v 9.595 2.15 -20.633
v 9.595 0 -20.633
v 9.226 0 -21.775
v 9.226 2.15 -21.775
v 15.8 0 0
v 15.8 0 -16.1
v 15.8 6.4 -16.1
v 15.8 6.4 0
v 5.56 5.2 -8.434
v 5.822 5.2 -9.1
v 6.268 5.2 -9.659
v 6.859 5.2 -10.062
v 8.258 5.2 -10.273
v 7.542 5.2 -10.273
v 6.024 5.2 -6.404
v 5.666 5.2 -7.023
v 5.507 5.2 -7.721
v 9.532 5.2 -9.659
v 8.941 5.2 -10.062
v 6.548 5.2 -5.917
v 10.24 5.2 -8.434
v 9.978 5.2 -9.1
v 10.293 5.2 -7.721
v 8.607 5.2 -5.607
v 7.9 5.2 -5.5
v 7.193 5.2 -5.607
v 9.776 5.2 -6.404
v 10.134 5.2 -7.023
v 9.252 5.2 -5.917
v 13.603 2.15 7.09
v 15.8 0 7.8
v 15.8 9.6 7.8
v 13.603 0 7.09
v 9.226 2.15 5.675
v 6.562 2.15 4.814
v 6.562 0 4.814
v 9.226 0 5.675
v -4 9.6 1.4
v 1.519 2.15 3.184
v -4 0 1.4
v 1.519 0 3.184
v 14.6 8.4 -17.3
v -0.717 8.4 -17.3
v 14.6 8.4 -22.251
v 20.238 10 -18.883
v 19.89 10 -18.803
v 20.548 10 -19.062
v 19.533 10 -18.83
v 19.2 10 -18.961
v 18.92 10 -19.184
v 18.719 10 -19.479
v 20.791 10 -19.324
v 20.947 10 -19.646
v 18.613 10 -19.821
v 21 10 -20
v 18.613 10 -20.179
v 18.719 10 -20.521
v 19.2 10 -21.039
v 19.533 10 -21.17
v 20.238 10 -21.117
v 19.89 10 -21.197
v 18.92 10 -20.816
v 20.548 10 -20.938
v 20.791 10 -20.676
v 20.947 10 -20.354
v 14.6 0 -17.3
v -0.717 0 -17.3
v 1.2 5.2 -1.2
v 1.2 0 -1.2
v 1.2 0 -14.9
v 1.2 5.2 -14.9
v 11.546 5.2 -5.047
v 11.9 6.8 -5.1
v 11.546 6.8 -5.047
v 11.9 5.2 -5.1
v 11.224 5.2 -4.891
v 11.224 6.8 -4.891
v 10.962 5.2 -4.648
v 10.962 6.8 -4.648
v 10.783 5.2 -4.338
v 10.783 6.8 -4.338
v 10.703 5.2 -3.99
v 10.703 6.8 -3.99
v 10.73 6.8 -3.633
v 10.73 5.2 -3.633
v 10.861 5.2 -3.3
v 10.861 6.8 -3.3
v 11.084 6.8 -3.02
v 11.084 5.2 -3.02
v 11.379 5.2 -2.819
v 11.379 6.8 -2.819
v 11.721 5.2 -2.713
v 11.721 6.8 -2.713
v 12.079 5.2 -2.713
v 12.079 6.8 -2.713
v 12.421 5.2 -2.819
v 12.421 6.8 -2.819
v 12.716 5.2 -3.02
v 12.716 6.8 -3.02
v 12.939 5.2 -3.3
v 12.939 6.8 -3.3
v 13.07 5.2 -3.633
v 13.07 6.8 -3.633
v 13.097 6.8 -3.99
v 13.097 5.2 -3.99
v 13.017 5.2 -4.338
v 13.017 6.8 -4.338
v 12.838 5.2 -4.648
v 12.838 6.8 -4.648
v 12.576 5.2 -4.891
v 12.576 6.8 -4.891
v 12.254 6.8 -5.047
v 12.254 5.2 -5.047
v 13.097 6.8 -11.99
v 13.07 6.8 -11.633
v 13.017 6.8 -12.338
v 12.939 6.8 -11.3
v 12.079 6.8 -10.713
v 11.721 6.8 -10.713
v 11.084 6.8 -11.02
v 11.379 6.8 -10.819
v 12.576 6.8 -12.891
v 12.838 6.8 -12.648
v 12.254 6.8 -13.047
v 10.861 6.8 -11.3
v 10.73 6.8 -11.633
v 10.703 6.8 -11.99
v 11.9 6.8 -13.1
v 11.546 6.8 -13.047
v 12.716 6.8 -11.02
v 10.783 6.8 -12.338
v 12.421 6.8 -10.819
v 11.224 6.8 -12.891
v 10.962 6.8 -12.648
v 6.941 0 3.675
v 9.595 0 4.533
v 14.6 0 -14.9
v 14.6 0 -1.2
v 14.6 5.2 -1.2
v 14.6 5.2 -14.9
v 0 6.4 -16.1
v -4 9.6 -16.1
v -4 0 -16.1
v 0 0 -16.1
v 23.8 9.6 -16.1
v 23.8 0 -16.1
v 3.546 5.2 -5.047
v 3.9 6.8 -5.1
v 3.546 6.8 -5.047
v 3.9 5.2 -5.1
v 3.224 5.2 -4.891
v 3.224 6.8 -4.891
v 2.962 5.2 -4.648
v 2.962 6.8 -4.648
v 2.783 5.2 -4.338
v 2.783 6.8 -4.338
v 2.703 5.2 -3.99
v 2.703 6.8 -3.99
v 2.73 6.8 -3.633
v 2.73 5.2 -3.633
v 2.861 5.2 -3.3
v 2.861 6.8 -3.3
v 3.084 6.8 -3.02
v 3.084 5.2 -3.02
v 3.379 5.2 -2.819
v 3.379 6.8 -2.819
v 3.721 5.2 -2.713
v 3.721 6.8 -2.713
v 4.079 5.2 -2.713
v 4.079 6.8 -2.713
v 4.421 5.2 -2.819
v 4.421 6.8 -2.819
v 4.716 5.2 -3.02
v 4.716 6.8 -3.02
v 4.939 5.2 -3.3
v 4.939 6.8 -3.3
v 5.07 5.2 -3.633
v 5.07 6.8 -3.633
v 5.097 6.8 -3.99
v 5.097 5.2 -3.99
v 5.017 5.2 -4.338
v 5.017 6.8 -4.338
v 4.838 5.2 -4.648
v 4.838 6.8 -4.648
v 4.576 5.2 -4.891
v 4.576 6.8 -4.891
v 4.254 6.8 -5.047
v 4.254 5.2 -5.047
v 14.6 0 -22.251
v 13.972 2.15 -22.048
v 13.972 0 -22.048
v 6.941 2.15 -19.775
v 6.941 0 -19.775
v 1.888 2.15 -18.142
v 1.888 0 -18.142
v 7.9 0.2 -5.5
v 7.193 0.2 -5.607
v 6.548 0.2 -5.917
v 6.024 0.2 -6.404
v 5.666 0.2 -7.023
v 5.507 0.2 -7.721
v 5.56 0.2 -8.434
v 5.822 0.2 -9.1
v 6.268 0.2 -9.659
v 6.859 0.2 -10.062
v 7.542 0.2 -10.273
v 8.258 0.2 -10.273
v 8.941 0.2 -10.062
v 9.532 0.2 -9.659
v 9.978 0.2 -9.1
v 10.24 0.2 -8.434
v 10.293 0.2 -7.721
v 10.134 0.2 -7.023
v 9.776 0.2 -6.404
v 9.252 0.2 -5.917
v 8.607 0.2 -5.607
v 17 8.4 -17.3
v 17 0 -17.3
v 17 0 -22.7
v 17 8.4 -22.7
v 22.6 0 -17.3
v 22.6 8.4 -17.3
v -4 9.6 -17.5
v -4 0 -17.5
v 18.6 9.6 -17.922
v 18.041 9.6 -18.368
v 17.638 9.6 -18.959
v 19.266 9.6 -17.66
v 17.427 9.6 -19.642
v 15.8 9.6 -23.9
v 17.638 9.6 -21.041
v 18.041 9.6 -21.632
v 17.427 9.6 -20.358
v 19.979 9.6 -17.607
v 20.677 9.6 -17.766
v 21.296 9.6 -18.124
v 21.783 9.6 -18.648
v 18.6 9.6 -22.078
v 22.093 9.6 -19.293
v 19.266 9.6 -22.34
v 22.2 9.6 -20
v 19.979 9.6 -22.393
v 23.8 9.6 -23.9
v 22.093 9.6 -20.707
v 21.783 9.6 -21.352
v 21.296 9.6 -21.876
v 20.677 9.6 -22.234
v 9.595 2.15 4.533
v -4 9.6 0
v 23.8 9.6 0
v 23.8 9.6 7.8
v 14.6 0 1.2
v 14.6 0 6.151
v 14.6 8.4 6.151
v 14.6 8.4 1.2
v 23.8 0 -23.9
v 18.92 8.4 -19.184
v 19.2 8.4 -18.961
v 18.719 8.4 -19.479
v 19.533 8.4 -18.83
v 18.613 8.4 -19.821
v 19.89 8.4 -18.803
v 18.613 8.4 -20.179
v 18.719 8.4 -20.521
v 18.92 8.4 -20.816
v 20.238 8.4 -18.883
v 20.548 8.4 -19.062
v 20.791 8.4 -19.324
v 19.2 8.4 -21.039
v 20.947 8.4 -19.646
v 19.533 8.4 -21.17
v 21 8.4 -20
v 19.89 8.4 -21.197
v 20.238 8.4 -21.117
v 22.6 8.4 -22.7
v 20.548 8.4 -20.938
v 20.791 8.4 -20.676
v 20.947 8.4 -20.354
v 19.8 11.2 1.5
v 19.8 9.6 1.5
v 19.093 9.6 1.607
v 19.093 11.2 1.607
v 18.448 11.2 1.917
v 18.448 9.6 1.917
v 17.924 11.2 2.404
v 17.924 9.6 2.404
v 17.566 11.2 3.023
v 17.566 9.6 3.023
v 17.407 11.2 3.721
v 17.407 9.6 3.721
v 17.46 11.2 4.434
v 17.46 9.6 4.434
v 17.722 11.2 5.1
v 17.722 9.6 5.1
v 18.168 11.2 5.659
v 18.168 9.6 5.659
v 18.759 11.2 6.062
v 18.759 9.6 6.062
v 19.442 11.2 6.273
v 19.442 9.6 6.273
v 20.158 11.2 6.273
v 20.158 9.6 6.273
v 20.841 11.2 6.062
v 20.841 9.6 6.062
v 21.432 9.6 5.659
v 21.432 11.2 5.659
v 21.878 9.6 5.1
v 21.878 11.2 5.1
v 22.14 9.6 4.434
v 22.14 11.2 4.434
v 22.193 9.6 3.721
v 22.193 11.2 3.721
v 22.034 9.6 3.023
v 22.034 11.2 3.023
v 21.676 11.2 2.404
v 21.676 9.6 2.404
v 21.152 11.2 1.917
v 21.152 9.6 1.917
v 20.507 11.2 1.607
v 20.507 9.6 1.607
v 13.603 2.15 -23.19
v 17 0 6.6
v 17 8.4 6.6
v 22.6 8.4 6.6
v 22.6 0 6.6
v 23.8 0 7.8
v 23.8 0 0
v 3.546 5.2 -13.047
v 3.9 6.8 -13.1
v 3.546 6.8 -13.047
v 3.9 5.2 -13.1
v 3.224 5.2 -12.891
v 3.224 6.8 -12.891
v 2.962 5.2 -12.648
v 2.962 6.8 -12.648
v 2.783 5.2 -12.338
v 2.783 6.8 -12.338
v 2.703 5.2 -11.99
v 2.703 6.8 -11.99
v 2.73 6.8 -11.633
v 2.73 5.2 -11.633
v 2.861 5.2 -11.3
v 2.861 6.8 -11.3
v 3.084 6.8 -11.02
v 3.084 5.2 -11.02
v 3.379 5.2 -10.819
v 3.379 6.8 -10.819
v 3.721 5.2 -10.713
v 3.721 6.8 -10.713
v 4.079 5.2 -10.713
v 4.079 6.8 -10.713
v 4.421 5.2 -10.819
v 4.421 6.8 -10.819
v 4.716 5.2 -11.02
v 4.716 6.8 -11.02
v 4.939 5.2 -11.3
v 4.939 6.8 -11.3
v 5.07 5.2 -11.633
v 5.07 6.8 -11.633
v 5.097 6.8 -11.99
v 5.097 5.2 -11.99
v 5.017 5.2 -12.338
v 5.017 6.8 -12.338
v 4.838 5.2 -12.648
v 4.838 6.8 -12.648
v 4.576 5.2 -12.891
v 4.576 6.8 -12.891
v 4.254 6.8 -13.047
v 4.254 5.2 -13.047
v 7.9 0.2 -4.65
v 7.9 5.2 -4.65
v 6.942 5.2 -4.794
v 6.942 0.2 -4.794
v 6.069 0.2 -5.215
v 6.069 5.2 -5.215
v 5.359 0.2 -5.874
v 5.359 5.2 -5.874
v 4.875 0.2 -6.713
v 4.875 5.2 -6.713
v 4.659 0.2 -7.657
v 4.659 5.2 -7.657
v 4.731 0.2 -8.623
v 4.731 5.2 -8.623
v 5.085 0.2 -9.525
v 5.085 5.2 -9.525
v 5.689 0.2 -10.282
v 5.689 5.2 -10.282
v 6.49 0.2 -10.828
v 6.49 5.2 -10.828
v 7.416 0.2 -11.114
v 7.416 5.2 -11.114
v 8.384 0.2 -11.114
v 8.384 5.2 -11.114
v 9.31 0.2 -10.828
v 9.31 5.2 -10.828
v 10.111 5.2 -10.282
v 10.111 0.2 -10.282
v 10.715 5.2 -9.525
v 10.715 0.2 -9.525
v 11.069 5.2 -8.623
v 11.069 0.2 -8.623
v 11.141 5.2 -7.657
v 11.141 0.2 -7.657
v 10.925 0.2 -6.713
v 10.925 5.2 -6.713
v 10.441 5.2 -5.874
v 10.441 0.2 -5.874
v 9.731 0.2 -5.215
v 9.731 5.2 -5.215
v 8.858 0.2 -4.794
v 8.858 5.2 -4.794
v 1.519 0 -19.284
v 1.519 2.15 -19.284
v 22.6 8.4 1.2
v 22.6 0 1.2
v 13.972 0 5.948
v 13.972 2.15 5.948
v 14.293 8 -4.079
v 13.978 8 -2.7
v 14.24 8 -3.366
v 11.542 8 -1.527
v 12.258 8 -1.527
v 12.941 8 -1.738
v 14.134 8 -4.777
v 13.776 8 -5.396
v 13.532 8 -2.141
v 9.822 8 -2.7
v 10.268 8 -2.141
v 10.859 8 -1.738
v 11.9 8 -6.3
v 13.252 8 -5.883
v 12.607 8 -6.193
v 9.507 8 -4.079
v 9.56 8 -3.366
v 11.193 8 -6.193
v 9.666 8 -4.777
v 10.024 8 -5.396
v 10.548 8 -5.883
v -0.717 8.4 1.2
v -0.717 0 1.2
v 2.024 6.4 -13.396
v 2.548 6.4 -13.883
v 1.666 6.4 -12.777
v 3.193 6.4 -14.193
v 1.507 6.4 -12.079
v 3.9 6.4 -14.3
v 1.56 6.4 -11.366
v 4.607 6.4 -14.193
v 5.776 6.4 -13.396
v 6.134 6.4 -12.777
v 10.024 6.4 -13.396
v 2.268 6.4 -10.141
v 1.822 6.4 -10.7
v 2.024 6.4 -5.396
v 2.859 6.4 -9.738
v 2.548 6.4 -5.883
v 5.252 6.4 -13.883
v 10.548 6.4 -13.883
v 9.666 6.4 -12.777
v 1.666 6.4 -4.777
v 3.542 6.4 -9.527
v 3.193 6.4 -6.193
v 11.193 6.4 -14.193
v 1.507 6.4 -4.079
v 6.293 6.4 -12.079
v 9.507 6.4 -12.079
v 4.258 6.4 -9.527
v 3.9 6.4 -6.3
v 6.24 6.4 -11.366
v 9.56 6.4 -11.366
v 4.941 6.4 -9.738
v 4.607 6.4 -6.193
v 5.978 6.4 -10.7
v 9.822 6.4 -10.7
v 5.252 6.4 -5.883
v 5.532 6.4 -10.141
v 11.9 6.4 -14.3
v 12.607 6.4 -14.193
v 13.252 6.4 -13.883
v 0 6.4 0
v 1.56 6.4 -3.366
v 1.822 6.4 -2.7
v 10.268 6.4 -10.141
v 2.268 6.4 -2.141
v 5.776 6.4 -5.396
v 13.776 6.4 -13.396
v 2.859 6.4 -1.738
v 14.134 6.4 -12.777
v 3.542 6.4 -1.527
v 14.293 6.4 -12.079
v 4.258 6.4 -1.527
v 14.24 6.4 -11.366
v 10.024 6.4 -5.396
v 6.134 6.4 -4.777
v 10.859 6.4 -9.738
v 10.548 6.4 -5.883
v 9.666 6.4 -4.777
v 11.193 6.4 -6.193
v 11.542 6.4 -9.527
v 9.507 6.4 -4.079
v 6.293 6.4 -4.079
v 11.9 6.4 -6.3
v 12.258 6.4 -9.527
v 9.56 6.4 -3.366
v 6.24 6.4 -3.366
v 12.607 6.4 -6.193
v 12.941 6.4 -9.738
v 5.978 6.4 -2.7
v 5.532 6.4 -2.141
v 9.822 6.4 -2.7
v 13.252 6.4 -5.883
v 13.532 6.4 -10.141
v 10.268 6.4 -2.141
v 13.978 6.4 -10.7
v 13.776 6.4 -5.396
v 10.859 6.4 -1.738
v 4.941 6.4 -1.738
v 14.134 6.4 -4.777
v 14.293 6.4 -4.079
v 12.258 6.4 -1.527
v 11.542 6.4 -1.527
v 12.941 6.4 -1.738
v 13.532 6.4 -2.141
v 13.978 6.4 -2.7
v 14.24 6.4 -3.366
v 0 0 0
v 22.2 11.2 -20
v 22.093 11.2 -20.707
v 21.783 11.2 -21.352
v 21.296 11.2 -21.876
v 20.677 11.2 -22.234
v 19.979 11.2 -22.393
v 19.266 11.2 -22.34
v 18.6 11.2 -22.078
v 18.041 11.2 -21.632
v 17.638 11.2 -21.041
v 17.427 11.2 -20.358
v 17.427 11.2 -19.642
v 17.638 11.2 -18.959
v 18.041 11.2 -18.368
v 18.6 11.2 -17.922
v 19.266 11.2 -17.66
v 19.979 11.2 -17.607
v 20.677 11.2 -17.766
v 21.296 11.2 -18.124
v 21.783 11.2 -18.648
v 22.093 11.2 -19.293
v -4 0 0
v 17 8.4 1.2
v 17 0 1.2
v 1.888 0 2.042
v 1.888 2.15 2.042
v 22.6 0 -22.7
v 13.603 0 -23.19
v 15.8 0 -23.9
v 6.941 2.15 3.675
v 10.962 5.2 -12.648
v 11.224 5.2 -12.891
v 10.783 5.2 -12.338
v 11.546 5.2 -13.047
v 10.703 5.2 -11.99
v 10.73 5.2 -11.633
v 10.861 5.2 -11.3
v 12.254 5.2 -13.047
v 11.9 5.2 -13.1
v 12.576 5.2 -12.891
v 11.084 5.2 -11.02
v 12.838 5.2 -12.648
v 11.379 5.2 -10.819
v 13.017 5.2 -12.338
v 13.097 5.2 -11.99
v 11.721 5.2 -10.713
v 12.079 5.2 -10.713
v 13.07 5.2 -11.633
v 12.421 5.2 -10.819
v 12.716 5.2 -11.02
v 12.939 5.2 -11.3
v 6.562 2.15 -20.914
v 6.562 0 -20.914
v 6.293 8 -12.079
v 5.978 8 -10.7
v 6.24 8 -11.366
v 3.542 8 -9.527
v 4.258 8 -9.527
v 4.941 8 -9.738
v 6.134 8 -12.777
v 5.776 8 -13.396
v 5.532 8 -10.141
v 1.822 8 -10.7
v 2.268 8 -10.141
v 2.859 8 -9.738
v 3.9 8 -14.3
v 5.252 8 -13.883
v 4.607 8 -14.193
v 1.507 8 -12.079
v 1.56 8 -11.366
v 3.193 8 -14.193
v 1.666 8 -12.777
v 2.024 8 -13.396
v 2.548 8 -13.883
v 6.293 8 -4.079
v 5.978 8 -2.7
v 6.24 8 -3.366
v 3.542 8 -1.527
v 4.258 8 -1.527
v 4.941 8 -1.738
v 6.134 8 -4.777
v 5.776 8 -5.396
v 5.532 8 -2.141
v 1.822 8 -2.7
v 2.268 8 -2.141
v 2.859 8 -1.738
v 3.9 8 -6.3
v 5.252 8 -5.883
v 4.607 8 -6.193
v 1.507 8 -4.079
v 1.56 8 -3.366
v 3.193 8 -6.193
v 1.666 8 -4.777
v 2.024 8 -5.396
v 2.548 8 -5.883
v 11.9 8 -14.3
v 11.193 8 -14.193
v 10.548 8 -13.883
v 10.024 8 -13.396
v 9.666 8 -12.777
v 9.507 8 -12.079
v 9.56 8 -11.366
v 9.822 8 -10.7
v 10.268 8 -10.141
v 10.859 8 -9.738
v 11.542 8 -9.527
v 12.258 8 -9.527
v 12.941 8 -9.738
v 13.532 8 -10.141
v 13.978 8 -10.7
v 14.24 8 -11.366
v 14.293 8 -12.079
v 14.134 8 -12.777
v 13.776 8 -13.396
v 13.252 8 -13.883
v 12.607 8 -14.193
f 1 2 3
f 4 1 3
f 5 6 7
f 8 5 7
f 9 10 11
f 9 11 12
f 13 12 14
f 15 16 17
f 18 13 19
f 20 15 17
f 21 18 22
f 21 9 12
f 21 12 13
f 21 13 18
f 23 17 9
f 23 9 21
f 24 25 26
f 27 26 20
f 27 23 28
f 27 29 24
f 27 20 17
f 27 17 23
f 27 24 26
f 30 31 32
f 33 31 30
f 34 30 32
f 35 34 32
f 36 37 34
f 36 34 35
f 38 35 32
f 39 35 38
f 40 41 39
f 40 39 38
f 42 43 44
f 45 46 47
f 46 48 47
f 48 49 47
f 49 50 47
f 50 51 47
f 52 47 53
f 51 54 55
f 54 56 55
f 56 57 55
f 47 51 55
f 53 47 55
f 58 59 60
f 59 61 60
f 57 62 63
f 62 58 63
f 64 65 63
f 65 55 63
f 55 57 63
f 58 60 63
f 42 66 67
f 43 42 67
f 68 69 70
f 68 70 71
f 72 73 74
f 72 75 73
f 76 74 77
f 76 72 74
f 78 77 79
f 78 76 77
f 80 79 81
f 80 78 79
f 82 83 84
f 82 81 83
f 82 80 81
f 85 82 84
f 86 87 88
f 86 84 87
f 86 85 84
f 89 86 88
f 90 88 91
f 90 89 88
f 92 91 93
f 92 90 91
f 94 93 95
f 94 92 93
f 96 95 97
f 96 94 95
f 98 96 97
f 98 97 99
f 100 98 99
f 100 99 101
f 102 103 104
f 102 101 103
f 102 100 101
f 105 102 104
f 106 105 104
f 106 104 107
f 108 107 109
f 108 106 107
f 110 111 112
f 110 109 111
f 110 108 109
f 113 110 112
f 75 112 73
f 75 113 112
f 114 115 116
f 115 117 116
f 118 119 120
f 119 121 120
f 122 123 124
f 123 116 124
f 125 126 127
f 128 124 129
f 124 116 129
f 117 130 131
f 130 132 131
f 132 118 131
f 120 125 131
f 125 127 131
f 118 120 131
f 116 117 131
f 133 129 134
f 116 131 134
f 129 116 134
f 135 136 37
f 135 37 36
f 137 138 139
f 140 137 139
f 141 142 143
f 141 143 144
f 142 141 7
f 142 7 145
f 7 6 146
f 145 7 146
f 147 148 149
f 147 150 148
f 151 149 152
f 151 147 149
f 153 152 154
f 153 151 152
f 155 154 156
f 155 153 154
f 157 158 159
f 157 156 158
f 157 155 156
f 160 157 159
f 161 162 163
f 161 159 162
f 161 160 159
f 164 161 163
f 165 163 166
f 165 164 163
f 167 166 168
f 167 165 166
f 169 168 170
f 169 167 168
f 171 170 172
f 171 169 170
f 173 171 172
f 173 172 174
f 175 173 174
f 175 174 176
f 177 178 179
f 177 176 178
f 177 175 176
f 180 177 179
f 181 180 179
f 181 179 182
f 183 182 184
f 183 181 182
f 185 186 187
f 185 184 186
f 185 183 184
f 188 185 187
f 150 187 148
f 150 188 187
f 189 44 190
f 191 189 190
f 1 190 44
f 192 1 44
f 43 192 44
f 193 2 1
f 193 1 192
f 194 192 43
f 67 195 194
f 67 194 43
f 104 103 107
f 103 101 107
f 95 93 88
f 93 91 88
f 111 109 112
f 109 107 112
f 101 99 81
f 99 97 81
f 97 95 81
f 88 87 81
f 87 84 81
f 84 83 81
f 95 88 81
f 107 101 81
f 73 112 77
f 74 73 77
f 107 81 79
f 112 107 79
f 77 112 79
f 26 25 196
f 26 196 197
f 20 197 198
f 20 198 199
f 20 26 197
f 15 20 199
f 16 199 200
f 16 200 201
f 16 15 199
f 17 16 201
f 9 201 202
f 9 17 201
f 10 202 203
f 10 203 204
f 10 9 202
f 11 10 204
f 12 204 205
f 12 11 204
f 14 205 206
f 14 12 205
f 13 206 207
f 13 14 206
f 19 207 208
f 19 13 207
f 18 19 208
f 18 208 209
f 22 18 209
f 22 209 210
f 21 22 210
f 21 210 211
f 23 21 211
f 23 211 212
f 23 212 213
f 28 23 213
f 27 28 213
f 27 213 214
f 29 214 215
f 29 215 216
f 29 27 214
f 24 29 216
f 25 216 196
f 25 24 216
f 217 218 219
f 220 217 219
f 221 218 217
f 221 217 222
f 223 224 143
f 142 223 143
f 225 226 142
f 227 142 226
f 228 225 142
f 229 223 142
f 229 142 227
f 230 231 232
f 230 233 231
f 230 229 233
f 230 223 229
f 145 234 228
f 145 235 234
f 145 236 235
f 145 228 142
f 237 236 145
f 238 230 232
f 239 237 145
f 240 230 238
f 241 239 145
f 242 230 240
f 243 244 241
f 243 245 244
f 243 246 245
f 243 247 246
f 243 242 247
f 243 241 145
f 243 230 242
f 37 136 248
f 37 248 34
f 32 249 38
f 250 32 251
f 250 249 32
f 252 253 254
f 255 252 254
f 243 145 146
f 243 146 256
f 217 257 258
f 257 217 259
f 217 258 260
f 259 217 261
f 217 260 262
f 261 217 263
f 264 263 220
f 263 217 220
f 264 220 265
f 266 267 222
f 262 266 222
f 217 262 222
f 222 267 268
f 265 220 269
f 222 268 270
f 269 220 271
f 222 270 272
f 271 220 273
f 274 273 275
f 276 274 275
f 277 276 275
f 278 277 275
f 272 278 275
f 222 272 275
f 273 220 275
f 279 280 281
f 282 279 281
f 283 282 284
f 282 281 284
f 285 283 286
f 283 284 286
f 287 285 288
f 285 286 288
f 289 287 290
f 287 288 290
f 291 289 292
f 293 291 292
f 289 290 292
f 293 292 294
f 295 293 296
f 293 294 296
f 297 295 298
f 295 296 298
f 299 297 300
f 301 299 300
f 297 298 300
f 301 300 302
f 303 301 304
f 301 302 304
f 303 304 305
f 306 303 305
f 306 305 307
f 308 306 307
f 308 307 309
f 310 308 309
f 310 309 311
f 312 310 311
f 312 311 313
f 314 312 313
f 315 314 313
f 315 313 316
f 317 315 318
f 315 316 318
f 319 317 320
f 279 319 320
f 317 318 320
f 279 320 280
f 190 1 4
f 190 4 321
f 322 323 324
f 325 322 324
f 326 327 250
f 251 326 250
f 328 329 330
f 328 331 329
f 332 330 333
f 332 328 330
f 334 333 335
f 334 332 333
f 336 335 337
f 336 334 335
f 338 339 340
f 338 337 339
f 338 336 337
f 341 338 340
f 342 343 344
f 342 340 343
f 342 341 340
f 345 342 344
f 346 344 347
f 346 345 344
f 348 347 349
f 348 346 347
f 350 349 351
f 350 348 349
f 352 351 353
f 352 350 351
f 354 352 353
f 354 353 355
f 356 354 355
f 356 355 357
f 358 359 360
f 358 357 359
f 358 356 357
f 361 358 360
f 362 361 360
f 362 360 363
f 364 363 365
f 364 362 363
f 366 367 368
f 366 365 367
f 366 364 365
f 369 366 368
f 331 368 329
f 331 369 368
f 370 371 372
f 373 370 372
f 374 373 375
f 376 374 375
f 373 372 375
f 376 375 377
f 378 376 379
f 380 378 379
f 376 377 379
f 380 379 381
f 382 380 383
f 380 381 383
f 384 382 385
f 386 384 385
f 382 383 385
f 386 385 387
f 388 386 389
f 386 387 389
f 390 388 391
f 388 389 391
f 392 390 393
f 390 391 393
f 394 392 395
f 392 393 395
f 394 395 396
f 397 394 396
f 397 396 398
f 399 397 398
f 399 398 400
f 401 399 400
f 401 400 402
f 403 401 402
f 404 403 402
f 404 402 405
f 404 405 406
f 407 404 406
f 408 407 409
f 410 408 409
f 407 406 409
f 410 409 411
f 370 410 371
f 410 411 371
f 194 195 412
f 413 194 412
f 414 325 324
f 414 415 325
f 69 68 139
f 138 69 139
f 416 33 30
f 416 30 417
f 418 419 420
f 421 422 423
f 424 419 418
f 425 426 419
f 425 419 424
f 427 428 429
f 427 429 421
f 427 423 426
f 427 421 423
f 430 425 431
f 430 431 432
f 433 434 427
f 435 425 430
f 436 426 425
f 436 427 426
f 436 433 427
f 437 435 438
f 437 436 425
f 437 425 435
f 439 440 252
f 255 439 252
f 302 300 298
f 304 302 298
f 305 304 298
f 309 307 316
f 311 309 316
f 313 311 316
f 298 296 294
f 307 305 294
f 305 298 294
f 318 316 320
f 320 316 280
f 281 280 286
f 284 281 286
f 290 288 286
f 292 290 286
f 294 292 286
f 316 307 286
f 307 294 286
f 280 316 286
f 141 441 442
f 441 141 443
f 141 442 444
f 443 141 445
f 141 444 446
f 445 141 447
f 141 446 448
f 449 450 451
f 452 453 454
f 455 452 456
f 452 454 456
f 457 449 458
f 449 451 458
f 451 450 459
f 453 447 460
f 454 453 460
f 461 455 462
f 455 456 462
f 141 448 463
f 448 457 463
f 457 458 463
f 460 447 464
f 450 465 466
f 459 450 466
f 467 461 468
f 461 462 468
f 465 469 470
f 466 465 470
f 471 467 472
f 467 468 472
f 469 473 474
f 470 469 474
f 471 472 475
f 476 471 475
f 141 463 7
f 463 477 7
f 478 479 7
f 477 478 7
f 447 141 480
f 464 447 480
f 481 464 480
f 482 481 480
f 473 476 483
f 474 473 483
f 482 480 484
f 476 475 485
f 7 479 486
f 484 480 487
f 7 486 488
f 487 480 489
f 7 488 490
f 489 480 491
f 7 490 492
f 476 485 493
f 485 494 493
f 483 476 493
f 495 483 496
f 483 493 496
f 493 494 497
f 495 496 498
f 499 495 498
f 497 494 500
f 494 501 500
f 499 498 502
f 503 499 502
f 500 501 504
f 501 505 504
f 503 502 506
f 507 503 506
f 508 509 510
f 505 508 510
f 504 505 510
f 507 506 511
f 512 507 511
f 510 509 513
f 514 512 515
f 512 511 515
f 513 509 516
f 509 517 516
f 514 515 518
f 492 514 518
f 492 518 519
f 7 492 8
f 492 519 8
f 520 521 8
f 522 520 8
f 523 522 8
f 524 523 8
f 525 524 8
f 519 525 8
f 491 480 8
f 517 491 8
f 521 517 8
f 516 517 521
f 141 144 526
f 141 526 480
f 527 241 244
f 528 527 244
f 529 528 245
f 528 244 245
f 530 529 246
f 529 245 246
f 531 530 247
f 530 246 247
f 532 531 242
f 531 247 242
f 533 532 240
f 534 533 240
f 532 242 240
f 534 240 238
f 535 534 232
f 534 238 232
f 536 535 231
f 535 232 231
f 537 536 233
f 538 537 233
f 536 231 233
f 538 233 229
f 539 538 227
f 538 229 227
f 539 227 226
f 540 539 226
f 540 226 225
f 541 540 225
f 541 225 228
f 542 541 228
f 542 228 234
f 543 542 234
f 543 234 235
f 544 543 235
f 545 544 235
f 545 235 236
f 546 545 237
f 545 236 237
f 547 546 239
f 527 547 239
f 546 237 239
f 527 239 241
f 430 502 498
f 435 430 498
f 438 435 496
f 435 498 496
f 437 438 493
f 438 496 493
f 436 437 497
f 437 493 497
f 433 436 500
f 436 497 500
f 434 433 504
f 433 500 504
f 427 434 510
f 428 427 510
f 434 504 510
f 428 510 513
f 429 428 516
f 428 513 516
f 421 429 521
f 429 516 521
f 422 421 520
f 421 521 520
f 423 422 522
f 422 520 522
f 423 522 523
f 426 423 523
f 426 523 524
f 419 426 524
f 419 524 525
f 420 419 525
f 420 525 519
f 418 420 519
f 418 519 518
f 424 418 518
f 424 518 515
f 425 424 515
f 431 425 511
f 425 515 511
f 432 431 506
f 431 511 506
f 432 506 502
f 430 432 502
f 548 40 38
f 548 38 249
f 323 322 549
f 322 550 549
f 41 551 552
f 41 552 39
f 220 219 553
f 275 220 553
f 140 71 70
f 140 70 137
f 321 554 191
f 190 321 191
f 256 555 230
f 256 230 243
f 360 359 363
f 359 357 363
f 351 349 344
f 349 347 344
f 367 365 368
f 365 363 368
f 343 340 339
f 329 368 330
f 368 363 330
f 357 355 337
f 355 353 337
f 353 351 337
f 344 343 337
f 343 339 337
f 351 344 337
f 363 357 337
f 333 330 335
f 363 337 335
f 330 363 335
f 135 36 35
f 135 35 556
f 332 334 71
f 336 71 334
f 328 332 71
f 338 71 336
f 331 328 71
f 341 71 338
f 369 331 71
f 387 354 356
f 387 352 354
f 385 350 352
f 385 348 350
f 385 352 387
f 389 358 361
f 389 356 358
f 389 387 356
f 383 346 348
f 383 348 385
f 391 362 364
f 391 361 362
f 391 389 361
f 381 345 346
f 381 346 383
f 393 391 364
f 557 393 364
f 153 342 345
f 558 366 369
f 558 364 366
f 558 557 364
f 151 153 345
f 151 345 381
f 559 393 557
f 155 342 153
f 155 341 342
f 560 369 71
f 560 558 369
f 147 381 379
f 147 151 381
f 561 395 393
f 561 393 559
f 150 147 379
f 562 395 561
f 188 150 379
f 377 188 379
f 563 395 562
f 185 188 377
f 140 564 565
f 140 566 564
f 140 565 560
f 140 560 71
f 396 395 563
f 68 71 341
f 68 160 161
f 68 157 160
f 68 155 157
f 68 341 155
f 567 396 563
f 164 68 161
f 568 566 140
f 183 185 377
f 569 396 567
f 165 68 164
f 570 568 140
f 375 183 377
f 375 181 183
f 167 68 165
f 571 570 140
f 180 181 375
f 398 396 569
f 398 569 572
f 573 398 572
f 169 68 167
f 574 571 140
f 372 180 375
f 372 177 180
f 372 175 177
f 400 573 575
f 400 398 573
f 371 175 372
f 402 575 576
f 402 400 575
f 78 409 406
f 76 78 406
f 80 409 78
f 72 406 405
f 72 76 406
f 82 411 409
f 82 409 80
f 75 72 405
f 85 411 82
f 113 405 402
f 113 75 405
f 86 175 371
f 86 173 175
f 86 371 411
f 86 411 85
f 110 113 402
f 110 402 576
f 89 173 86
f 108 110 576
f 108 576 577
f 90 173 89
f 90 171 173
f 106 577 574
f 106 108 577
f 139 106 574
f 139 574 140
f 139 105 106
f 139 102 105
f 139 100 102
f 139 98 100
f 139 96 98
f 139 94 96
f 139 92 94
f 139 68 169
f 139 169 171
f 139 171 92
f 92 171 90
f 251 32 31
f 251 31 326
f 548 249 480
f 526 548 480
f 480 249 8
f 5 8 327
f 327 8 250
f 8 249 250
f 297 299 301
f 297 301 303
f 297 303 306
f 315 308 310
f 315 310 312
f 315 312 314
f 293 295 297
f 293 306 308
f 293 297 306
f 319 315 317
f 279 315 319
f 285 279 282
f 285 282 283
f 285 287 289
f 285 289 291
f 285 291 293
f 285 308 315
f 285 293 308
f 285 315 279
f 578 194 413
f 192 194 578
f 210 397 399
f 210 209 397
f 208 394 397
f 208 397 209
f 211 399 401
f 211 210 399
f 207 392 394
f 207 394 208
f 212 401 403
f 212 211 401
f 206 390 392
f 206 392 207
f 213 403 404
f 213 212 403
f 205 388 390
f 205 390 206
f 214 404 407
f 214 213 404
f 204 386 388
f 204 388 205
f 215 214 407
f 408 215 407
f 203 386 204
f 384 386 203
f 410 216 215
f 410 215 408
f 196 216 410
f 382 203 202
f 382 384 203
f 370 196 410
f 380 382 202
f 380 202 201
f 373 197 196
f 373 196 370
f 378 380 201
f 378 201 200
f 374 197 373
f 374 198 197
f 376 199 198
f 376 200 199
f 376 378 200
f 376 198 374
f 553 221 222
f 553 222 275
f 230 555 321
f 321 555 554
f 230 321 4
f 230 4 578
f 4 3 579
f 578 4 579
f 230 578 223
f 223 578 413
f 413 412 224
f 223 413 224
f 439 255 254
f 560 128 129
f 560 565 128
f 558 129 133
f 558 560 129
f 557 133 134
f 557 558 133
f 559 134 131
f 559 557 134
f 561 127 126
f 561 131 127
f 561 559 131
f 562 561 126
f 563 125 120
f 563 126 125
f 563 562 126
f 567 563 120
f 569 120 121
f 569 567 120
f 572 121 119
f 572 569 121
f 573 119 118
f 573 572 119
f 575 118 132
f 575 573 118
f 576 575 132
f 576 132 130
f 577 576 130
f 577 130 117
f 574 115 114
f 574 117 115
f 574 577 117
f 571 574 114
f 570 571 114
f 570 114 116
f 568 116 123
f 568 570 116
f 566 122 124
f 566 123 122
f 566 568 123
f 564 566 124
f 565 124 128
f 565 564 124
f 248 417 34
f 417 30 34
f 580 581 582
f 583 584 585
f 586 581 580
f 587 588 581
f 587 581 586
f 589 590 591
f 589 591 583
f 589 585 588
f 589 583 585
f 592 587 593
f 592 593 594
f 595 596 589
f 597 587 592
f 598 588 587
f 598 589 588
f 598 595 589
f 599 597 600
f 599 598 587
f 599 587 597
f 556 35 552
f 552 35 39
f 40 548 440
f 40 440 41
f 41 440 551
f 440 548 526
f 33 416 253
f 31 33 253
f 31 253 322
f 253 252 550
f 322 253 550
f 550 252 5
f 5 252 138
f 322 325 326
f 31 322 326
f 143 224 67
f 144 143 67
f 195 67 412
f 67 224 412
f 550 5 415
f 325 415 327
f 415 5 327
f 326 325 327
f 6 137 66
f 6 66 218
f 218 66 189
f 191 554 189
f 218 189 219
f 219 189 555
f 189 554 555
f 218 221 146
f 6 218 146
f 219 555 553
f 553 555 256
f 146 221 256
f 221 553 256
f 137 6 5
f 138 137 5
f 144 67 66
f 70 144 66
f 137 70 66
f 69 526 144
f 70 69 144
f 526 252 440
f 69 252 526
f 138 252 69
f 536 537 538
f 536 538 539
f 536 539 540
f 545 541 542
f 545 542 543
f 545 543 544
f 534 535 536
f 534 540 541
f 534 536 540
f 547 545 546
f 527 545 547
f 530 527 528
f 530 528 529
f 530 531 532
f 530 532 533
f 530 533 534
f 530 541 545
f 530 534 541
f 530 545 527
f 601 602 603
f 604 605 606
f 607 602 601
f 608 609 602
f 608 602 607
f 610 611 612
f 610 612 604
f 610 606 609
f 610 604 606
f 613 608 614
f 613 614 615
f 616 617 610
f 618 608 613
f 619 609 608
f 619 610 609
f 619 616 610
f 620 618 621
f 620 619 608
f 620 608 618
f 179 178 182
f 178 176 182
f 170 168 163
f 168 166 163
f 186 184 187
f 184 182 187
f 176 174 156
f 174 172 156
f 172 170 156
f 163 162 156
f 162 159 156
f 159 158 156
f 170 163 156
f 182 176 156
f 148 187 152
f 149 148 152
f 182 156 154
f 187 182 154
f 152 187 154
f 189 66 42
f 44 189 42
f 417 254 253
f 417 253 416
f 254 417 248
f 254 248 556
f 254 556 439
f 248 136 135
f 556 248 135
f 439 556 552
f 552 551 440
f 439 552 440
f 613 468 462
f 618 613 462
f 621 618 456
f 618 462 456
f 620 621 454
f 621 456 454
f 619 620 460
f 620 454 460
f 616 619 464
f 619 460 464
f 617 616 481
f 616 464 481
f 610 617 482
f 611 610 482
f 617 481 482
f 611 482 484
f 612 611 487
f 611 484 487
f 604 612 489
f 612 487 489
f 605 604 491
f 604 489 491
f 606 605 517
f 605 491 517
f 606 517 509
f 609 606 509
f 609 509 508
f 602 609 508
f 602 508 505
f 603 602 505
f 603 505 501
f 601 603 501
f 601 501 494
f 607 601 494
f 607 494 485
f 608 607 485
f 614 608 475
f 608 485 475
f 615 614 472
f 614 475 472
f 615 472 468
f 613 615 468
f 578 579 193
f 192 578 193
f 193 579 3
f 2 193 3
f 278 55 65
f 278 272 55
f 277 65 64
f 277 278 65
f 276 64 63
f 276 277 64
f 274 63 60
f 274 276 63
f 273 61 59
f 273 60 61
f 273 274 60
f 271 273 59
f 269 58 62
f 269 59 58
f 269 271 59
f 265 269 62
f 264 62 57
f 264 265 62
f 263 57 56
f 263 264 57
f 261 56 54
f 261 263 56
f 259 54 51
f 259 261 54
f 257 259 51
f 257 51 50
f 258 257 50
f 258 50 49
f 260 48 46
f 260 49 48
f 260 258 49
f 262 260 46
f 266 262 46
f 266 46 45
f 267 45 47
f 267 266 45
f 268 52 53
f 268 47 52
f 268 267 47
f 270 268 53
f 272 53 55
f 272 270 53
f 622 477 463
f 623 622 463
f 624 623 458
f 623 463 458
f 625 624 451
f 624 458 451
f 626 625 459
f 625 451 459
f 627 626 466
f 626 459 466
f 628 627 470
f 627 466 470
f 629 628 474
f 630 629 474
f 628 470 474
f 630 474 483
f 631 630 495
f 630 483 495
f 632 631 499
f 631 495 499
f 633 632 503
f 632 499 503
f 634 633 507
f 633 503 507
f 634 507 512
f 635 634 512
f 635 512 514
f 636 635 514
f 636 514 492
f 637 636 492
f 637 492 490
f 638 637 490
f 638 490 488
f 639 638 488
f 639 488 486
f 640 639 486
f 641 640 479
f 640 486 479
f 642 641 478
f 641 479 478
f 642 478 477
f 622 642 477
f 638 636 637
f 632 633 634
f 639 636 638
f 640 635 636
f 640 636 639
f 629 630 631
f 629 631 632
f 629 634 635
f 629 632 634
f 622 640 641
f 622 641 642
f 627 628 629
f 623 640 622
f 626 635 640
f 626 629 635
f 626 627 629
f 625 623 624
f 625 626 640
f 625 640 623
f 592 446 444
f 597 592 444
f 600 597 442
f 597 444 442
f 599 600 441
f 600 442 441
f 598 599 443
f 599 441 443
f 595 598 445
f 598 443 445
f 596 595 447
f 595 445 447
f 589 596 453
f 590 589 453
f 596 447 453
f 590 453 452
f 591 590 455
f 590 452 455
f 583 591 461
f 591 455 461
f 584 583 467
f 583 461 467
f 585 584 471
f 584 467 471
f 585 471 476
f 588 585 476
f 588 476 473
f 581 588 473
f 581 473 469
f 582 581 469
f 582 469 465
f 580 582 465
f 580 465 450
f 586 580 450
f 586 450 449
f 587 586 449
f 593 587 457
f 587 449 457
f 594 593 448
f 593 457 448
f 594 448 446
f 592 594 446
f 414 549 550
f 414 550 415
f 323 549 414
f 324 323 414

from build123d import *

# Parameters (mm, degrees)
SKETCH1_W             = 15.8
SKETCH1_H             = 6.4
BOSS_EXTRUDE1_DEPTH   = 16.1
SKETCH2_R             = 2.4
BOSS_EXTRUDE2_DEPTH   = 1.6
LPATTERN1_COUNT       = 3
LPATTERN1_PITCH       = 8
LPATTERN1_COUNT_DIR2  = 2
LPATTERN1_PITCH_DIR2  = 8
SHELL1_T              = -1.2
SKETCH3_R             = 3.25
SKETCH3_R_2           = 2.4
BOSS_EXTRUDE3_DEPTH   = 5
BOSS_EXTRUDE4_DEPTH   = 9.6
BOSS_EXTRUDE4_2_DEPTH = 9.6
SKETCH7_R             = 2.4
BOSS_EXTRUDE5_DEPTH   = 1.6
SPLIT1_OUTLINE_W      = 8
SPLIT1_OUTLINE_H      = 9.6
SPLIT1_DEPTH          = 7.8
SPLIT1_START          = 15.8
SPLIT1_2_OUTLINE_W    = 9.6
SPLIT1_2_OUTLINE_H    = 7.8
SPLIT1_2_DEPTH        = 8
SPLIT1_3_OUTLINE_W    = 8
SPLIT1_3_OUTLINE_H    = 7.8
SPLIT1_3_DEPTH        = 9.6
SPLIT1_START_2        = 9.6
SPLIT1_4_OUTLINE_R    = 2.4
SPLIT1_4_DEPTH        = 1.6
SPLIT1_5_OUTLINE_W    = 12.2
SPLIT1_5_OUTLINE_H    = 10
SPLIT1_5_DEPTH        = 8
SHELL2_T              = -1.2
SHELL3_T              = -1.2
SHELL4_T              = -1.2
SHELL5_T              = -1.2
CUT_EXTRUDE1_DEPTH    = 2.15


# Read off the part's stored shape, not the designer's step: Split1
with BuildPart() as part:
    # Sketch1 → Boss-Extrude1 (new body)
    with BuildSketch(Plane.XY):
        with Locations((7.9, 3.2)):
            Rectangle(SKETCH1_W, SKETCH1_H)
    extrude(amount=-BOSS_EXTRUDE1_DEPTH)

    # Sketch2 → Boss-Extrude2 (add)
    with BuildSketch(Plane(origin=(0, 6.4, 0), x_dir=(1, 0, 0), z_dir=(0, 1, 0))):
        with Locations(Location((3.9, 3.9, 0), (0, 0, 90))):
            Circle(SKETCH2_R)
    boss_extrude2 = extrude(amount=BOSS_EXTRUDE2_DEPTH)

    # LPattern1: Boss-Extrude2 3 × 2, 2 skipped
    with Locations(*[(i * LPATTERN1_PITCH, 0, -j * LPATTERN1_PITCH_DIR2) for i in range(LPATTERN1_COUNT) for j in range(LPATTERN1_COUNT_DIR2) if (i, j) not in ((0, 0), (2, 0), (2, 1))]):
        add(boss_extrude2)

    # Shell1
    shell1_openings = [part.faces().sort_by_distance(p)[0] for p in [
        (7.9, 0, -8.05),
    ]]
    offset(amount=SHELL1_T, openings=shell1_openings, kind=Kind.INTERSECTION)

    # Sketch3 → Boss-Extrude3 (add)
    with BuildSketch(Plane.XZ.offset(-5.2)):
        with Locations(Location((7.9, -7.9, 0), (0, 0, 90))):
            Circle(SKETCH3_R)
        with Locations(Location((7.9, -7.9, 0), (0, 0, 90))):
            Circle(SKETCH3_R_2, mode=Mode.SUBTRACT)
    extrude(amount=BOSS_EXTRUDE3_DEPTH)


with BuildPart() as body_2:
    # Sketch4 → Boss-Extrude4 (new body)
    with BuildSketch(Plane(origin=(0, 0, 0), x_dir=(-1, 0, 0), z_dir=(0, -1, 0))):
        Polygon((-15.8, 23.9), (4, 17.5), (4, 16.1), (0, 16.1), (-15.8, 16.1), (-23.8, 16.1), (-23.8, 23.9), align=None)
    extrude(amount=-BOSS_EXTRUDE4_DEPTH)

    # Sketch7 → Boss-Extrude5 (add)
    with BuildSketch(Plane(origin=(0, 9.6, 0), x_dir=(1, 0, 0), z_dir=(0, 1, 0))):
        with Locations(Location((19.8, 20, 0), (0, 0, 90))):
            Circle(SKETCH7_R)
        with Locations(Location((19.8, -3.9, 0), (0, 0, 90))):
            Circle(SKETCH7_R)
    extrude(amount=BOSS_EXTRUDE5_DEPTH)


with BuildPart() as body_3:
    # Sketch4 → Boss-Extrude4 2 (new body)
    with BuildSketch(Plane(origin=(0, 0, 0), x_dir=(-1, 0, 0), z_dir=(0, -1, 0))):
        Polygon((-23.8, -7.8), (-15.8, -7.8), (4, -1.4), (4, 0), (0, 0), (-15.8, 0), (-23.8, 0), align=None)
    extrude(amount=-BOSS_EXTRUDE4_2_DEPTH)

    # Split1 2 outline → Split1 2 (cut)
    with BuildSketch(Plane.YZ.offset(SPLIT1_START)):
        with Locations((4.8, 3.9)):
            Rectangle(SPLIT1_2_OUTLINE_W, SPLIT1_2_OUTLINE_H)
    extrude(amount=SPLIT1_2_DEPTH, mode=Mode.SUBTRACT)

    # Shell5
    shell5_openings = [body_3.faces().sort_by_distance(p)[0] for p in [
        (8.195652174, 0, 2.671014493),
    ]]
    offset(amount=SHELL5_T, openings=shell5_openings)


with BuildPart() as boss_extrude5_piece_1:
    # of the separate pieces the step leaves, piece 1, a body of its own (boss_extrude5_pieces)
    add(body_2.part.solids().sort_by_distance((15.8, 0, -23.9))[0])

    # Split1 5 outline → Split1 5 (cut)
    with BuildSketch(Plane.YZ.offset(SPLIT1_START)):
        with Locations((5.1, -20)):
            Rectangle(SPLIT1_5_OUTLINE_W, SPLIT1_5_OUTLINE_H)
    extrude(amount=SPLIT1_5_DEPTH, mode=Mode.SUBTRACT)

    # Shell3
    shell3_openings = [boss_extrude5_piece_1.faces().sort_by_distance(p)[0] for p in [
        (8.195652174, 0, -18.771014493),
    ]]
    offset(amount=SHELL3_T, openings=shell3_openings)


with BuildPart() as boss_extrude5_piece_2:
    # of the separate pieces the step leaves, piece 2, a body of its own (boss_extrude5_pieces)
    add(body_2.part.solids().sort_by_distance((19.8, 9.6, 1.5))[0])


with BuildPart() as body_5:
    # Split1 outline → Split1 (new body)
    with BuildSketch(Plane.XY):
        with Locations((19.8, 4.8)):
            Rectangle(SPLIT1_OUTLINE_W, SPLIT1_OUTLINE_H)
    extrude(amount=SPLIT1_DEPTH)

    # Shell4
    shell4_openings = [body_5.faces().sort_by_distance(p)[0] for p in [
        (19.8, 0, 3.9),
    ]]
    offset(amount=SHELL4_T, openings=shell4_openings, kind=Kind.INTERSECTION)


with BuildPart() as body_6:
    # Split1 3 outline → Split1 3 (new body)
    with BuildSketch(Plane(origin=(0, 0, 0), x_dir=(1, 0, 0), z_dir=(0, 1, 0))):
        with Locations((19.8, 20)):
            Rectangle(SPLIT1_3_OUTLINE_W, SPLIT1_3_OUTLINE_H)
    extrude(amount=SPLIT1_3_DEPTH)

    # Split1 4 outline → Split1 4 (add)
    with BuildSketch(Plane(origin=(0, 0, 0), x_dir=(1, 0, 0), z_dir=(0, 1, 0)).offset(SPLIT1_START_2)):
        with Locations((19.8, 20)):
            Circle(SPLIT1_4_OUTLINE_R)
    extrude(amount=SPLIT1_4_DEPTH)

    # Shell2
    shell2_openings = [body_6.faces().sort_by_distance(p)[0] for p in [
        (19.8, 0, -20),
    ]]
    offset(amount=SHELL2_T, openings=shell2_openings, kind=Kind.INTERSECTION)


with BuildPart() as part_1:
    add(part.part)

    # Combine1: union Boss-Extrude5 piece 1, body 6
    add(boss_extrude5_piece_1.part)
    add(body_6.part)


with BuildPart() as cut_extrude1_tool:
    # Sketch8 → Cut-Extrude1 (new body)
    with BuildSketch(Plane.XZ):
        Polygon((9.595306383, -20.63331204), (9.226229137, -21.775144772), (13.603254607, -23.189940883), (13.972331853, -22.048108152), align=None)
        Polygon((1.518858201, -19.283873358), (6.561952764, -20.91396453), (6.941436129, -19.775495393), (1.887935447, -18.142040627), align=None)
        Polygon((13.972331853, 5.948108152), (9.595306383, 4.53331204), (9.226229137, 5.675144772), (13.603254607, 7.089940883), align=None)
        Polygon((6.941436129, 3.675495393), (1.887935447, 2.042040627), (1.518858201, 3.183873358), (6.561952764, 4.81396453), align=None)
    extrude(amount=-CUT_EXTRUDE1_DEPTH)


with BuildPart() as part_2:
    add(part_1.part)

    # Cut-Extrude1: cut by cut_extrude1_tool
    add(cut_extrude1_tool.part, mode=Mode.SUBTRACT)


with BuildPart() as body_3_1:
    add(body_3.part)

    # Cut-Extrude1: cut by cut_extrude1_tool
    add(cut_extrude1_tool.part, mode=Mode.SUBTRACT)

    # Combine2: union body 5, part
    add(body_5.part)
    add(part_2.part)


solid = Compound([boss_extrude5_piece_2.part, body_3_1.part])
